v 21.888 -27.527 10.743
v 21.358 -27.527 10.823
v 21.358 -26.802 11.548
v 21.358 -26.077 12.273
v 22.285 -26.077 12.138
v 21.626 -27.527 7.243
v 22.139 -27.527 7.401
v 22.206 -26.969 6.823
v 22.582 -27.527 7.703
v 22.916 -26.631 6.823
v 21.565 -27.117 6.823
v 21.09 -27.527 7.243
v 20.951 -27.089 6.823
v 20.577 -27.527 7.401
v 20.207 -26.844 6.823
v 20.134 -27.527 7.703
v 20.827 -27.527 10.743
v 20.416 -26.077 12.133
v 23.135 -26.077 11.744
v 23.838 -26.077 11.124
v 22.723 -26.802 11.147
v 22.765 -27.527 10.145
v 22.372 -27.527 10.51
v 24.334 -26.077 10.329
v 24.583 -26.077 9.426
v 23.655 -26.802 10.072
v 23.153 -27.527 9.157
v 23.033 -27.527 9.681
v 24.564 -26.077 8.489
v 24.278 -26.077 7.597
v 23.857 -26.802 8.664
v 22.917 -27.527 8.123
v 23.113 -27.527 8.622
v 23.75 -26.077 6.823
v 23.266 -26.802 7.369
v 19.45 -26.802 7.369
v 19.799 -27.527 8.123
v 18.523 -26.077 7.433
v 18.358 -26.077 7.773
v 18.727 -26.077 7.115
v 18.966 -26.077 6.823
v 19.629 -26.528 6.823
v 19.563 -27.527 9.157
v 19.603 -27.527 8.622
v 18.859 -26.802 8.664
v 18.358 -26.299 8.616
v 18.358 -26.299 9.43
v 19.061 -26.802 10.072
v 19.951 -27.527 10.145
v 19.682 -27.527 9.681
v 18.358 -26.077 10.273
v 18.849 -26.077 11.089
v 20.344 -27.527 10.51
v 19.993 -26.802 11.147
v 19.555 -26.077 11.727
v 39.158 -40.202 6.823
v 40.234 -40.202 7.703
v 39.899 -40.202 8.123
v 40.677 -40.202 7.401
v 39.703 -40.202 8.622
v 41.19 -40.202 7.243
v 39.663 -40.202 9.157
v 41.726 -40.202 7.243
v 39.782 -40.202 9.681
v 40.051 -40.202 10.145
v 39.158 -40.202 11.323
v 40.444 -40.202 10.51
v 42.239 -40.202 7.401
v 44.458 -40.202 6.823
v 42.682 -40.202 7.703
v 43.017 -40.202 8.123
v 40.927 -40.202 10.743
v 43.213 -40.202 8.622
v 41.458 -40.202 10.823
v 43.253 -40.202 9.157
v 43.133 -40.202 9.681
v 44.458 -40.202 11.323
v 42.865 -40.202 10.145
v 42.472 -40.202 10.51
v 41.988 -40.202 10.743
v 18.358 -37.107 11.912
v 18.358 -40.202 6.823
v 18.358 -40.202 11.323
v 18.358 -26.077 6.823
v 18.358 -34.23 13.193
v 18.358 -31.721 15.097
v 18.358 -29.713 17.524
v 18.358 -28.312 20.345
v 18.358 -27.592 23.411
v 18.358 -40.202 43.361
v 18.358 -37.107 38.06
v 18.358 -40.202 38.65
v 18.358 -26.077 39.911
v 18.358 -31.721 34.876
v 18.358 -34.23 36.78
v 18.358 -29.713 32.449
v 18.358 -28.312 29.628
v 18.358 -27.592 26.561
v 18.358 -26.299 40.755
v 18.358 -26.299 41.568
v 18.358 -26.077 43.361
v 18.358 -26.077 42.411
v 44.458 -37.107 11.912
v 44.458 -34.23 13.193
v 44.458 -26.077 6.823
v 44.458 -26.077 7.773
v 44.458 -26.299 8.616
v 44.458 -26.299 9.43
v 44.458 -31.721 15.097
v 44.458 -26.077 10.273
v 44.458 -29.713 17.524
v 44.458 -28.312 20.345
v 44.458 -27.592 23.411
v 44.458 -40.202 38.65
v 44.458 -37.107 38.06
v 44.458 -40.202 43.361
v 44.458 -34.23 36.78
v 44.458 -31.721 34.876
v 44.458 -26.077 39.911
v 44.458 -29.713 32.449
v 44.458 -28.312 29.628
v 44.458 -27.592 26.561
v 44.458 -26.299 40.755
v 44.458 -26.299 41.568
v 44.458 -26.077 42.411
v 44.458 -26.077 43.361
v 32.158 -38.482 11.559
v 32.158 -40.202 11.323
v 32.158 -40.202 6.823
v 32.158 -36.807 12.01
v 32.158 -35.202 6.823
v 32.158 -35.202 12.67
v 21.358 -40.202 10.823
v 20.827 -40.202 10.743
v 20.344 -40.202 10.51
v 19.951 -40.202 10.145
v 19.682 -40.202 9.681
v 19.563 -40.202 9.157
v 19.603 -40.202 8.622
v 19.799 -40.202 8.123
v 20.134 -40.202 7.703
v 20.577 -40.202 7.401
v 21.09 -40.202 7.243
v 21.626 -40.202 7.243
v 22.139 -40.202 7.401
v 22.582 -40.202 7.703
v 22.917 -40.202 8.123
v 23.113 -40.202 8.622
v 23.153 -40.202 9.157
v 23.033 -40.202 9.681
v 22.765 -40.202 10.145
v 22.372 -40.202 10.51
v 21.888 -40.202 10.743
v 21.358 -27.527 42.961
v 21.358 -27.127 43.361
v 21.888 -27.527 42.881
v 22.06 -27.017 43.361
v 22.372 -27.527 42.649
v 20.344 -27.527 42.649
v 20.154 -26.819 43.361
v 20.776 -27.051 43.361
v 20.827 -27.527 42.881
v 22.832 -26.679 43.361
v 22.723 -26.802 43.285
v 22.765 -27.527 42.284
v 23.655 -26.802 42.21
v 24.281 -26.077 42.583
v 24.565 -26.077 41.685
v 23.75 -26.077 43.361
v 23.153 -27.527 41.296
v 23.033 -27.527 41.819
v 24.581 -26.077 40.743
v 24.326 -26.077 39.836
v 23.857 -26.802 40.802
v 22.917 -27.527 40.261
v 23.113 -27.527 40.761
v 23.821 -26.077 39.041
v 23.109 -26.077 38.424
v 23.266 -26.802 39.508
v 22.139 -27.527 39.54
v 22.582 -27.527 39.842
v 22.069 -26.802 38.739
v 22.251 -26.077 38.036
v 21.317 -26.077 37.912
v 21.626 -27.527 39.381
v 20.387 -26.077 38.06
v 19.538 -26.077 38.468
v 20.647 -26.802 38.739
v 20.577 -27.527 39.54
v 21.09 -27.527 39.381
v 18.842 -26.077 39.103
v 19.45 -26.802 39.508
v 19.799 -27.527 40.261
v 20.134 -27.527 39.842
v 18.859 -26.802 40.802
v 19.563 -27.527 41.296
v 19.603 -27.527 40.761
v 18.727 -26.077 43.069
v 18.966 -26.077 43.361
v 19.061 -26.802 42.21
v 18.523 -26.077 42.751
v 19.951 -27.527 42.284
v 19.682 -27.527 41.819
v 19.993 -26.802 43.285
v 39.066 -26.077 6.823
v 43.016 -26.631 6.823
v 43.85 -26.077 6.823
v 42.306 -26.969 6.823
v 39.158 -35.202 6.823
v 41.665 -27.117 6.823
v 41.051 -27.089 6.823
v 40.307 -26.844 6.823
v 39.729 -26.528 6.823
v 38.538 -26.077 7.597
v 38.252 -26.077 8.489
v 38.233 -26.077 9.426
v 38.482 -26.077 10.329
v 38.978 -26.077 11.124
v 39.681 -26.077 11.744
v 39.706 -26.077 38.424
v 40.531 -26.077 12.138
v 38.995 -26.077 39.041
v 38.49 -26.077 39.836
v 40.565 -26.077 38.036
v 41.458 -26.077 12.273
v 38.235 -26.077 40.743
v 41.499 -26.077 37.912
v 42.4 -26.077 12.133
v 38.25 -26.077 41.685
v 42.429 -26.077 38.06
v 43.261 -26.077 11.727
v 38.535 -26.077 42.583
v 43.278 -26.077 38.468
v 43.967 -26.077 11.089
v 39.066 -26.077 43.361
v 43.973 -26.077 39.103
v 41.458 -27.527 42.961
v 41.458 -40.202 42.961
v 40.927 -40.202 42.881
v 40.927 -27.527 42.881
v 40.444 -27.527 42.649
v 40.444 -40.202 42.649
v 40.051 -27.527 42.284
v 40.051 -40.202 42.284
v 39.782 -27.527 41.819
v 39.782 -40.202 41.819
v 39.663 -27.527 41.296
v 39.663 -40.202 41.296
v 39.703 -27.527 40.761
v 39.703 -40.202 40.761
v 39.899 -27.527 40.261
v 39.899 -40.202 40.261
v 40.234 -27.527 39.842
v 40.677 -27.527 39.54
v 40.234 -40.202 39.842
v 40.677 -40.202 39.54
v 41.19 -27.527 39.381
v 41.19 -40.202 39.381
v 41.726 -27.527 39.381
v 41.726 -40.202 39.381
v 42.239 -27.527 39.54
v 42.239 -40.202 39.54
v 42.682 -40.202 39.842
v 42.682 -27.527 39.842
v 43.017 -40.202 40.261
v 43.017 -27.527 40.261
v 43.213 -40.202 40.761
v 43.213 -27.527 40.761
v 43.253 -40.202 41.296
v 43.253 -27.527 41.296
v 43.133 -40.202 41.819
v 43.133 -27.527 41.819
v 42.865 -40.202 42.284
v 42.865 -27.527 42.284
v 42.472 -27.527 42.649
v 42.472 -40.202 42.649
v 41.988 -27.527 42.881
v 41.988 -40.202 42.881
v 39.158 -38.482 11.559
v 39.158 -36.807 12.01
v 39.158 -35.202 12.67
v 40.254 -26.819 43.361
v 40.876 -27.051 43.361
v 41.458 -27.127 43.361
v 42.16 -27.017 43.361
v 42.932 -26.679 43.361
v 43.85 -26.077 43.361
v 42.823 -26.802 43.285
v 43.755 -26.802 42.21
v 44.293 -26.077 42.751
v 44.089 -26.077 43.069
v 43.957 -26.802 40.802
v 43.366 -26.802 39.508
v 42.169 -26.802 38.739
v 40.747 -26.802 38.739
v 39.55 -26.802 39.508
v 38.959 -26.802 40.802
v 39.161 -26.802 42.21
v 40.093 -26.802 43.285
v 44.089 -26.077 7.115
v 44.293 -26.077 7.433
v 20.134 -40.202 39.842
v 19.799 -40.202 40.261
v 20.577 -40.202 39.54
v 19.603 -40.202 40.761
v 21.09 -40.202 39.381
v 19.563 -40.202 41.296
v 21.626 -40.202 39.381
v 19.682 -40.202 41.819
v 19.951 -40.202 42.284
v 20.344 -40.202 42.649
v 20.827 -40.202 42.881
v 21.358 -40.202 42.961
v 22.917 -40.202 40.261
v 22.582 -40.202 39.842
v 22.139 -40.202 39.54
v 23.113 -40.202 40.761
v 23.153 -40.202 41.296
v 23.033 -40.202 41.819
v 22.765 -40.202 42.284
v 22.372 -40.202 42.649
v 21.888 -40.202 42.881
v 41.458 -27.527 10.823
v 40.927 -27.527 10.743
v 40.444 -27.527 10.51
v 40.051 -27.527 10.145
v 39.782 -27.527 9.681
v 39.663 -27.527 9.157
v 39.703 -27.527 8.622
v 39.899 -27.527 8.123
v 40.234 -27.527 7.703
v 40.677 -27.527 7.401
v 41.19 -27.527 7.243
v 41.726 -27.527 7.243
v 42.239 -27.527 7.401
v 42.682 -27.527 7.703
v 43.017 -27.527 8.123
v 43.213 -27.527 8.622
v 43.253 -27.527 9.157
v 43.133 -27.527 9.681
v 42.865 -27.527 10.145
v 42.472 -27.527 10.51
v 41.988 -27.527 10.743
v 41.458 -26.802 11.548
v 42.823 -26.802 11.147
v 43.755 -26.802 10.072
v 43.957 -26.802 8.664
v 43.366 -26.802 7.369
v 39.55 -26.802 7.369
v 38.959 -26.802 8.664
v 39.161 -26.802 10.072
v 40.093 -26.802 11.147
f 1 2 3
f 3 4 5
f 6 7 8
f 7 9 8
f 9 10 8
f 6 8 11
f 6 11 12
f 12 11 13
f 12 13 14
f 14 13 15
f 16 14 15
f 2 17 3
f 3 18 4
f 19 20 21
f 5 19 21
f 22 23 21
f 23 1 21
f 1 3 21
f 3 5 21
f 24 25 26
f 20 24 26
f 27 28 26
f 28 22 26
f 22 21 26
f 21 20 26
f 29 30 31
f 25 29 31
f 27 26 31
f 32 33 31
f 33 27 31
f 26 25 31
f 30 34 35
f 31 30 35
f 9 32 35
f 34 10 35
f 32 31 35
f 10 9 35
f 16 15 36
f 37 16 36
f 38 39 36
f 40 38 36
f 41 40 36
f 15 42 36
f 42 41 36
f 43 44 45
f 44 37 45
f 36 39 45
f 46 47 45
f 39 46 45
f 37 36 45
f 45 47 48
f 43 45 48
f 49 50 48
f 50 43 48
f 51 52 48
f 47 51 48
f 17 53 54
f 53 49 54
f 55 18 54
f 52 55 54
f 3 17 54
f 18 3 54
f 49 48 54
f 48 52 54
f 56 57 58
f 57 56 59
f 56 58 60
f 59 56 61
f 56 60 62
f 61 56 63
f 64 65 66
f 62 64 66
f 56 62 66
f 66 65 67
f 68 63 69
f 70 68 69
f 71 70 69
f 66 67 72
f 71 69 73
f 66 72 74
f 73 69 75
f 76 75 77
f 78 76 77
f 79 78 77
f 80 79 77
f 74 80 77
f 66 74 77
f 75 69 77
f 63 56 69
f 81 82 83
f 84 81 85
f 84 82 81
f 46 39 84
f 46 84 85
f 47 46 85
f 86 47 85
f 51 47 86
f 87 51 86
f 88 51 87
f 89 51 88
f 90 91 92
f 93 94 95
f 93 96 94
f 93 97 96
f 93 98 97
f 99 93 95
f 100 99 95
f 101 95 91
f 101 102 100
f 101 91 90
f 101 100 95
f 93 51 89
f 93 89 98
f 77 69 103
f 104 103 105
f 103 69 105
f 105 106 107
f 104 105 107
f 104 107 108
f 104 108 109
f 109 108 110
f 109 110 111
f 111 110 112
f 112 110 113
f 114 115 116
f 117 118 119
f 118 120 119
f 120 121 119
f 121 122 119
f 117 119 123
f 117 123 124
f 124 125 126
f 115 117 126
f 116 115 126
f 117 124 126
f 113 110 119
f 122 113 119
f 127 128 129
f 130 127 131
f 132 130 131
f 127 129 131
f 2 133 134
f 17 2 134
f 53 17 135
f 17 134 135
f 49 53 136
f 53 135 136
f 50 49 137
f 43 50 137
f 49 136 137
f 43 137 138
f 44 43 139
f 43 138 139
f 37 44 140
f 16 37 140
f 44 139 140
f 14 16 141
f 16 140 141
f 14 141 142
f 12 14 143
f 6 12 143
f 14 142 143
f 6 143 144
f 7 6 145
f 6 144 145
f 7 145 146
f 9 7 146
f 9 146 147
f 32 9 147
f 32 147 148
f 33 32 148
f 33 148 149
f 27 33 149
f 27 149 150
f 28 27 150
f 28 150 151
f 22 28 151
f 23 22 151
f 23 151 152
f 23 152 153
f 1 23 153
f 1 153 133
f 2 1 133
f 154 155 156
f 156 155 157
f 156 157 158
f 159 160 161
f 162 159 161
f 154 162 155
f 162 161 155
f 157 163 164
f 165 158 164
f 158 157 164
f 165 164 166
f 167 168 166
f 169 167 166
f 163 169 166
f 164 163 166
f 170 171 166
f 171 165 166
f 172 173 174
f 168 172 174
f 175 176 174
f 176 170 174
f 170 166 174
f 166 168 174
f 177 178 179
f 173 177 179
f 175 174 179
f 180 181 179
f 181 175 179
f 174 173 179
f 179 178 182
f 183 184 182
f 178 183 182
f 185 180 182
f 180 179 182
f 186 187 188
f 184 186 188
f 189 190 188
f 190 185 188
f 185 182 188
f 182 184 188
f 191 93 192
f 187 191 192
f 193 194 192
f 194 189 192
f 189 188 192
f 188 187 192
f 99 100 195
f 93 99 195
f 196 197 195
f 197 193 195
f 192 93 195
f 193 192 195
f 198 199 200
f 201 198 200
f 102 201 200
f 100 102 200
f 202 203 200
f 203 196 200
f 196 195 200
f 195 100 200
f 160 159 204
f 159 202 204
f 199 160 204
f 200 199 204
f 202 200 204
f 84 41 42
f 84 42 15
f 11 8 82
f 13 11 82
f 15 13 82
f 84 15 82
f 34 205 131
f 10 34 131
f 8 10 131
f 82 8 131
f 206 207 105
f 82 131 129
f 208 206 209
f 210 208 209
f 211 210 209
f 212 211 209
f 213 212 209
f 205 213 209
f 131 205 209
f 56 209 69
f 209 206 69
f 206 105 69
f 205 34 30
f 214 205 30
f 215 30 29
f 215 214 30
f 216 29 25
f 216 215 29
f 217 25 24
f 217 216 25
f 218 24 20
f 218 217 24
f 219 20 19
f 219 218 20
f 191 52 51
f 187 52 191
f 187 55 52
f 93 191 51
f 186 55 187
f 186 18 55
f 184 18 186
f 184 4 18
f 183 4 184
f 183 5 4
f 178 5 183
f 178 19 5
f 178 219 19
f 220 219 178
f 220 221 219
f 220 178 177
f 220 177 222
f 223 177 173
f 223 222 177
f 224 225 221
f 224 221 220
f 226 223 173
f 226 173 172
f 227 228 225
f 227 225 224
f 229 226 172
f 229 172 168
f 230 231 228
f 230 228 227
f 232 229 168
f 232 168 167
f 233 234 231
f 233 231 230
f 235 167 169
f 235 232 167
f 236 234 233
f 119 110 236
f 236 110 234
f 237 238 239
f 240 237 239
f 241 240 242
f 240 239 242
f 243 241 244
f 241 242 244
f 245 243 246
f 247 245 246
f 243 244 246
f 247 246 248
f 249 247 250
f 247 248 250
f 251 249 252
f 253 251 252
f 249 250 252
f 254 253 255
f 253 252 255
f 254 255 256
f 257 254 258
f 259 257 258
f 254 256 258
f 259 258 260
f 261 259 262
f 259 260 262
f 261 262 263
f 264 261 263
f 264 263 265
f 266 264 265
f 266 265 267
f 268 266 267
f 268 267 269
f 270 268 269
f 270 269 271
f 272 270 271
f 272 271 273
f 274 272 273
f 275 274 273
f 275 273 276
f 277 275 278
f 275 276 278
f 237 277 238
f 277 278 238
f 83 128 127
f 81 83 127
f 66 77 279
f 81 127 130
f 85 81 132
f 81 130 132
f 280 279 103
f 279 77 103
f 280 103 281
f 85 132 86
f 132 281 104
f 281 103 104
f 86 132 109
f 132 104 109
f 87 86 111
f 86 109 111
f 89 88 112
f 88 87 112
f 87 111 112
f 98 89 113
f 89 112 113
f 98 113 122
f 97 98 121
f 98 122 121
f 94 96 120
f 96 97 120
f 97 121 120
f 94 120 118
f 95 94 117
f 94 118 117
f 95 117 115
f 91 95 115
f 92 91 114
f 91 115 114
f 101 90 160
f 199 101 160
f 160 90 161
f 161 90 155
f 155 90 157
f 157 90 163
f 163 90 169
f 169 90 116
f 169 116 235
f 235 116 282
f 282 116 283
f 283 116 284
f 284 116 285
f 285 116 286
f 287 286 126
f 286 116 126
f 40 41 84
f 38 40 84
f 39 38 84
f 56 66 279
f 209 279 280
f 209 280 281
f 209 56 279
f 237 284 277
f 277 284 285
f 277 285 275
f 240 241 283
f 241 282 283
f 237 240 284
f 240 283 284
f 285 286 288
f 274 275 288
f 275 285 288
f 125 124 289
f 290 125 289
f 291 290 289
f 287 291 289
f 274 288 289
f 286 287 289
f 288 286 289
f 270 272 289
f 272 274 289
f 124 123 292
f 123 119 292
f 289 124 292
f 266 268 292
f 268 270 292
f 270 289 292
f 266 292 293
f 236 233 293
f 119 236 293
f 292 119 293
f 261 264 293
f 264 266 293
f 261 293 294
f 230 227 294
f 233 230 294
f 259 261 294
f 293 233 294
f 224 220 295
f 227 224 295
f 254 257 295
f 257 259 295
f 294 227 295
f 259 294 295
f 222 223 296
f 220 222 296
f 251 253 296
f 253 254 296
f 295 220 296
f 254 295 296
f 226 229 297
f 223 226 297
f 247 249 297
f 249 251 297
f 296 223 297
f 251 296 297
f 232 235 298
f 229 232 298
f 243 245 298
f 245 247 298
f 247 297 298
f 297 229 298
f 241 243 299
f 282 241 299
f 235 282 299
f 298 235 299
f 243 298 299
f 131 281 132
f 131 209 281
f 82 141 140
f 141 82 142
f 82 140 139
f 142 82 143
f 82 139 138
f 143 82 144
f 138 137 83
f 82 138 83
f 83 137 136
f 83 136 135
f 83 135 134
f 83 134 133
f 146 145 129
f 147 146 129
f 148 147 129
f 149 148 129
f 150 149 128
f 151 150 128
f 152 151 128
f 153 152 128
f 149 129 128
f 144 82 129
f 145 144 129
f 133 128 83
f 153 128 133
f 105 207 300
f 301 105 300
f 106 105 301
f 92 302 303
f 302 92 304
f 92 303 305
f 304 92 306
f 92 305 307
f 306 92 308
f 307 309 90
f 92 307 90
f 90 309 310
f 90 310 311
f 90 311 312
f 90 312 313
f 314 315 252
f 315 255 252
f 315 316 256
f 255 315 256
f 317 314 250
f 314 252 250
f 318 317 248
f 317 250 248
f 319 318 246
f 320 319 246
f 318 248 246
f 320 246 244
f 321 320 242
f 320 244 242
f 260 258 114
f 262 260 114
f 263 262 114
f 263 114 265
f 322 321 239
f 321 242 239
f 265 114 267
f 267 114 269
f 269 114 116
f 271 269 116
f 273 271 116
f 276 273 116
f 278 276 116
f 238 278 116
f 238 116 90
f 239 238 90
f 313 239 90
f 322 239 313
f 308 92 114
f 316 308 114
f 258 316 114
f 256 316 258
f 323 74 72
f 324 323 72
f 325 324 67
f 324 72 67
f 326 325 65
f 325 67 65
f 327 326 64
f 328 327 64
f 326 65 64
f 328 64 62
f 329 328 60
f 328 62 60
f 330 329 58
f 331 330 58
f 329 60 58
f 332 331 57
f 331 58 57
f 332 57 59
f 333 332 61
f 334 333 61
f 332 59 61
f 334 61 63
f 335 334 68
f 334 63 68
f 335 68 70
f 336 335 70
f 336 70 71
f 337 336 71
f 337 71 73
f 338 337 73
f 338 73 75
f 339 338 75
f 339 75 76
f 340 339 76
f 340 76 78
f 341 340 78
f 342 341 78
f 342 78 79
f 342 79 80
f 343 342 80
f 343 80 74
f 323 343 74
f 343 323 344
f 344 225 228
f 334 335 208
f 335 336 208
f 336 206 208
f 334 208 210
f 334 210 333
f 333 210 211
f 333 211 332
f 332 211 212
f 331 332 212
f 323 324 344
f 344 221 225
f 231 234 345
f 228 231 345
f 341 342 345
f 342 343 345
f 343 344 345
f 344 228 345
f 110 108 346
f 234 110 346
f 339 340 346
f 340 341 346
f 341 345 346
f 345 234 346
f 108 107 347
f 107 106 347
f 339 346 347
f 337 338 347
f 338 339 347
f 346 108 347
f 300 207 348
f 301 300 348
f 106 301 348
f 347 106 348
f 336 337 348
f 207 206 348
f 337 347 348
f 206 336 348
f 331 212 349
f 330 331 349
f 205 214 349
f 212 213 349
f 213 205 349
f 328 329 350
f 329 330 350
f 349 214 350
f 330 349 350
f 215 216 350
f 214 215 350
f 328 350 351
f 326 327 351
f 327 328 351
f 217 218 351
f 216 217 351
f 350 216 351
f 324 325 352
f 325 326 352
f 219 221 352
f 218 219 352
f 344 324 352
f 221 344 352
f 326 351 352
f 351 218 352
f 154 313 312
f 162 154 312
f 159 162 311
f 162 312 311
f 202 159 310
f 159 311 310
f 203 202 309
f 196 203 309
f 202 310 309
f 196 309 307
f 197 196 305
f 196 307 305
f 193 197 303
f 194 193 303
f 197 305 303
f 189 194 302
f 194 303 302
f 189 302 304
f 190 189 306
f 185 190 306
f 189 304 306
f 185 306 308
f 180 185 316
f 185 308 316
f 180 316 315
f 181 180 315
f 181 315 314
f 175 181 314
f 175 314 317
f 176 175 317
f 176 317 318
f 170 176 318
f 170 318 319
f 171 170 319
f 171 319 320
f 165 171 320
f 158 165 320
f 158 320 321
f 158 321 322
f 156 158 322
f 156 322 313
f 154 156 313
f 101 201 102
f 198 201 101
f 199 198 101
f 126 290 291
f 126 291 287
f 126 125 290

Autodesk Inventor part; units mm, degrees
ref_plane "YZ Plane" through (0, 0, 0) normal (1, 0, 0) x (0, 1, 0)
ref_plane "XZ Plane" through (0, 0, 0) normal (0, 1, 0) x (-1, 0, 0)
ref_plane "Work Plane1" through (44.4579, -56.5766, -83.6387) normal (-1, 0, 0) x (0, 0, 1)
sketch "Sketch1" plane through (44.4579, -56.5766, -83.6387) normal (-1, 0, 0) x (0, 0, 1)
  line L0 (90.4615, 0) -> (90.4615, 14.375) projected
  line L1 (90.4615, 14.375) -> (94.9615, 14.375) projected
  arc A0 (94.9615, 14.375) -> (122.2885, 14.375) centre (108.625, 15.375) ccw projected
  line L2 (122.2885, 14.375) -> (127, 14.375) projected
  line L3 (127, 14.375) -> (127, 30.5) projected
  line L4 (52.8275, 30.5) -> (127, 30.5) projected
  line L5 (52.8275, 30.5) -> (52.8275, 10) projected
  line L6 (52.8275, 10) -> (59.8275, 10) projected
  line L7 (59.8275, 10) -> (59.8275, 0) projected
  line L8 (59.8275, 0) -> (90.4615, 0) projected
  line L9 (119.625, 13.875) -> (120.125, 13.875) projected
  line L10 (120.125, 13.875) -> (120.125, 16.875) projected
  line L11 (120.125, 16.875) -> (119.625, 16.875) projected
  line L12 (119.625, 16.875) -> (119.625, 13.875) projected
  line L13 (97.125, 16.875) -> (96.625, 16.875) projected
  line L14 (96.625, 16.875) -> (96.625, 13.875) projected
  line L15 (96.625, 13.875) -> (97.125, 13.875) projected
  line L16 (97.125, 13.875) -> (97.125, 16.875) projected
  circle A1 centre (108.625, 15.375) radius 5 projected
  circle A2 centre (108.625, 15.375) radius 13.7 projected
  line L17 (90.4615, 14.375) -> (127, 14.375)
  line L18 (127, 14.375) -> (127, 30.5)
  line L19 (127, 30.5) -> (90.4615, 30.5)
  line L20 (90.4615, 30.5) -> (90.4615, 14.375)
  line L21 (90.4615, 16.375) -> (127, 16.375)
  point P0 (83.6387, 56.5766)
  point P1 (94.9615, 16.375)
  point P2 (122.2885, 16.375)
  point P3 (127, 16.375)
  dimension "d0" = 2
ref_plane "Work Plane2" through (18.3579, -55.5766, 10.6113) normal (1, 0, 0) x (0, 1, 0)
extrude "Extrusion1" add sketch "Sketch1" along normal up to surface (26.1 mm away) contours L20 L4 L3 L21 A2
sketch "Sketch2" plane through (44.4579, -26.0766, 43.3613) normal (0, 1, 0) x (1, 0, 0)
  line L0 (-26.1, 0) -> (-26.1, 4.7115) projected
  line L1 (0, 0) -> (-26.1, 0) projected
  line L2 (0, 4.7115) -> (0, 0) projected
  line L3 (0, 4.7115) -> (-26.1, 4.7115) projected
  line L4 (-26.1, 32.0385) -> (-26.1, 36.5385) projected
  line L5 (0, 32.0385) -> (-26.1, 32.0385) projected
  line L6 (0, 36.5385) -> (0, 32.0385) projected
  line L7 (0, 36.5385) -> (-26.1, 36.5385) projected
  line L8 (-3, 34.3385) -> (-23.1, 34.3385)
  line L9 (-23.1, 34.3385) -> (-23.1, 2.2)
  line L10 (-23.1, 2.2) -> (-3, 2.2)
  line L11 (-3, 2.2) -> (-3, 34.3385)
  point P0 (-44.4579, 43.3613)
  dimension "d3" = 2.2
  dimension "d4" = 2.2
  dimension "d5" = 3
  dimension "d6" = 3
hole "Hole1" at (41.4579, -26.0766, 9.0229) at (41.4579, -26.0766, 41.1613) at (21.3579, -26.0766, 41.1613) at (21.3579, -26.0766, 9.0229) direction (0, -1, 0) diameter 3.6 end through all countersink diameter 6.5 countersink angle 90
sketch "Sketch3" plane through (44.4579, -40.2016, 6.8229) normal (0, 0, -1) x (-1, 0, 0)
  line L0 (0, 14.125) -> (0.6078, 14.125) projected
  line L1 (0, 14.125) -> (0, 0) projected
  line L2 (0, 0) -> (26.1, 0) projected
  line L3 (26.1, 14.125) -> (26.1, 0) projected
  line L4 (25.4922, 14.125) -> (26.1, 14.125) projected
  line L5 (5.3922, 14.125) -> (20.7078, 14.125) projected
  line L6 (12.3, 0.5) -> (12.3, -2.5) projected
  line L7 (12.3, 0.5) -> (6.3, 0.5) projected
  line L8 (6.3, -2.5) -> (6.3, 0.5) projected
  line L9 (12.3, -2.5) -> (6.3, -2.5) projected
  line L10 (12.3, -14.7) -> (12.3, 12.7) projected
  line L11 (26.1, -2) -> (26.1, -16.375) projected
  line L12 (23.1, -2) -> (26.1, -2) projected
  line L13 (3, -2) -> (23.1, -2) projected
  line L14 (0, -2) -> (3, -2) projected
  line L15 (0, -16.375) -> (0, -2) projected
  line L16 (0, -16.375) -> (26.1, -16.375) projected
  line L17 (12.3, -2) -> (5.3, -2)
  line L18 (5.3, -2) -> (5.3, 5)
  line L19 (5.3, 5) -> (12.3, 5)
  line L20 (12.3, 5) -> (12.3, -2)
  point P0 (44.4579, 40.2016)
  point P1 (12.3, 5)
  point P2 (5.3, -2)
  dimension "d14" = 7
  dimension "d15" = 7
extrude "Extrusion2" cut sketch "Sketch3" against normal blind 10 contours L18 L19 L10 L7 L8 L2 | L2 L8 L13 L18 | L8 L7 L6 L2 | L2 L6 L13 L8
properties part number "right_motor_ceil"
